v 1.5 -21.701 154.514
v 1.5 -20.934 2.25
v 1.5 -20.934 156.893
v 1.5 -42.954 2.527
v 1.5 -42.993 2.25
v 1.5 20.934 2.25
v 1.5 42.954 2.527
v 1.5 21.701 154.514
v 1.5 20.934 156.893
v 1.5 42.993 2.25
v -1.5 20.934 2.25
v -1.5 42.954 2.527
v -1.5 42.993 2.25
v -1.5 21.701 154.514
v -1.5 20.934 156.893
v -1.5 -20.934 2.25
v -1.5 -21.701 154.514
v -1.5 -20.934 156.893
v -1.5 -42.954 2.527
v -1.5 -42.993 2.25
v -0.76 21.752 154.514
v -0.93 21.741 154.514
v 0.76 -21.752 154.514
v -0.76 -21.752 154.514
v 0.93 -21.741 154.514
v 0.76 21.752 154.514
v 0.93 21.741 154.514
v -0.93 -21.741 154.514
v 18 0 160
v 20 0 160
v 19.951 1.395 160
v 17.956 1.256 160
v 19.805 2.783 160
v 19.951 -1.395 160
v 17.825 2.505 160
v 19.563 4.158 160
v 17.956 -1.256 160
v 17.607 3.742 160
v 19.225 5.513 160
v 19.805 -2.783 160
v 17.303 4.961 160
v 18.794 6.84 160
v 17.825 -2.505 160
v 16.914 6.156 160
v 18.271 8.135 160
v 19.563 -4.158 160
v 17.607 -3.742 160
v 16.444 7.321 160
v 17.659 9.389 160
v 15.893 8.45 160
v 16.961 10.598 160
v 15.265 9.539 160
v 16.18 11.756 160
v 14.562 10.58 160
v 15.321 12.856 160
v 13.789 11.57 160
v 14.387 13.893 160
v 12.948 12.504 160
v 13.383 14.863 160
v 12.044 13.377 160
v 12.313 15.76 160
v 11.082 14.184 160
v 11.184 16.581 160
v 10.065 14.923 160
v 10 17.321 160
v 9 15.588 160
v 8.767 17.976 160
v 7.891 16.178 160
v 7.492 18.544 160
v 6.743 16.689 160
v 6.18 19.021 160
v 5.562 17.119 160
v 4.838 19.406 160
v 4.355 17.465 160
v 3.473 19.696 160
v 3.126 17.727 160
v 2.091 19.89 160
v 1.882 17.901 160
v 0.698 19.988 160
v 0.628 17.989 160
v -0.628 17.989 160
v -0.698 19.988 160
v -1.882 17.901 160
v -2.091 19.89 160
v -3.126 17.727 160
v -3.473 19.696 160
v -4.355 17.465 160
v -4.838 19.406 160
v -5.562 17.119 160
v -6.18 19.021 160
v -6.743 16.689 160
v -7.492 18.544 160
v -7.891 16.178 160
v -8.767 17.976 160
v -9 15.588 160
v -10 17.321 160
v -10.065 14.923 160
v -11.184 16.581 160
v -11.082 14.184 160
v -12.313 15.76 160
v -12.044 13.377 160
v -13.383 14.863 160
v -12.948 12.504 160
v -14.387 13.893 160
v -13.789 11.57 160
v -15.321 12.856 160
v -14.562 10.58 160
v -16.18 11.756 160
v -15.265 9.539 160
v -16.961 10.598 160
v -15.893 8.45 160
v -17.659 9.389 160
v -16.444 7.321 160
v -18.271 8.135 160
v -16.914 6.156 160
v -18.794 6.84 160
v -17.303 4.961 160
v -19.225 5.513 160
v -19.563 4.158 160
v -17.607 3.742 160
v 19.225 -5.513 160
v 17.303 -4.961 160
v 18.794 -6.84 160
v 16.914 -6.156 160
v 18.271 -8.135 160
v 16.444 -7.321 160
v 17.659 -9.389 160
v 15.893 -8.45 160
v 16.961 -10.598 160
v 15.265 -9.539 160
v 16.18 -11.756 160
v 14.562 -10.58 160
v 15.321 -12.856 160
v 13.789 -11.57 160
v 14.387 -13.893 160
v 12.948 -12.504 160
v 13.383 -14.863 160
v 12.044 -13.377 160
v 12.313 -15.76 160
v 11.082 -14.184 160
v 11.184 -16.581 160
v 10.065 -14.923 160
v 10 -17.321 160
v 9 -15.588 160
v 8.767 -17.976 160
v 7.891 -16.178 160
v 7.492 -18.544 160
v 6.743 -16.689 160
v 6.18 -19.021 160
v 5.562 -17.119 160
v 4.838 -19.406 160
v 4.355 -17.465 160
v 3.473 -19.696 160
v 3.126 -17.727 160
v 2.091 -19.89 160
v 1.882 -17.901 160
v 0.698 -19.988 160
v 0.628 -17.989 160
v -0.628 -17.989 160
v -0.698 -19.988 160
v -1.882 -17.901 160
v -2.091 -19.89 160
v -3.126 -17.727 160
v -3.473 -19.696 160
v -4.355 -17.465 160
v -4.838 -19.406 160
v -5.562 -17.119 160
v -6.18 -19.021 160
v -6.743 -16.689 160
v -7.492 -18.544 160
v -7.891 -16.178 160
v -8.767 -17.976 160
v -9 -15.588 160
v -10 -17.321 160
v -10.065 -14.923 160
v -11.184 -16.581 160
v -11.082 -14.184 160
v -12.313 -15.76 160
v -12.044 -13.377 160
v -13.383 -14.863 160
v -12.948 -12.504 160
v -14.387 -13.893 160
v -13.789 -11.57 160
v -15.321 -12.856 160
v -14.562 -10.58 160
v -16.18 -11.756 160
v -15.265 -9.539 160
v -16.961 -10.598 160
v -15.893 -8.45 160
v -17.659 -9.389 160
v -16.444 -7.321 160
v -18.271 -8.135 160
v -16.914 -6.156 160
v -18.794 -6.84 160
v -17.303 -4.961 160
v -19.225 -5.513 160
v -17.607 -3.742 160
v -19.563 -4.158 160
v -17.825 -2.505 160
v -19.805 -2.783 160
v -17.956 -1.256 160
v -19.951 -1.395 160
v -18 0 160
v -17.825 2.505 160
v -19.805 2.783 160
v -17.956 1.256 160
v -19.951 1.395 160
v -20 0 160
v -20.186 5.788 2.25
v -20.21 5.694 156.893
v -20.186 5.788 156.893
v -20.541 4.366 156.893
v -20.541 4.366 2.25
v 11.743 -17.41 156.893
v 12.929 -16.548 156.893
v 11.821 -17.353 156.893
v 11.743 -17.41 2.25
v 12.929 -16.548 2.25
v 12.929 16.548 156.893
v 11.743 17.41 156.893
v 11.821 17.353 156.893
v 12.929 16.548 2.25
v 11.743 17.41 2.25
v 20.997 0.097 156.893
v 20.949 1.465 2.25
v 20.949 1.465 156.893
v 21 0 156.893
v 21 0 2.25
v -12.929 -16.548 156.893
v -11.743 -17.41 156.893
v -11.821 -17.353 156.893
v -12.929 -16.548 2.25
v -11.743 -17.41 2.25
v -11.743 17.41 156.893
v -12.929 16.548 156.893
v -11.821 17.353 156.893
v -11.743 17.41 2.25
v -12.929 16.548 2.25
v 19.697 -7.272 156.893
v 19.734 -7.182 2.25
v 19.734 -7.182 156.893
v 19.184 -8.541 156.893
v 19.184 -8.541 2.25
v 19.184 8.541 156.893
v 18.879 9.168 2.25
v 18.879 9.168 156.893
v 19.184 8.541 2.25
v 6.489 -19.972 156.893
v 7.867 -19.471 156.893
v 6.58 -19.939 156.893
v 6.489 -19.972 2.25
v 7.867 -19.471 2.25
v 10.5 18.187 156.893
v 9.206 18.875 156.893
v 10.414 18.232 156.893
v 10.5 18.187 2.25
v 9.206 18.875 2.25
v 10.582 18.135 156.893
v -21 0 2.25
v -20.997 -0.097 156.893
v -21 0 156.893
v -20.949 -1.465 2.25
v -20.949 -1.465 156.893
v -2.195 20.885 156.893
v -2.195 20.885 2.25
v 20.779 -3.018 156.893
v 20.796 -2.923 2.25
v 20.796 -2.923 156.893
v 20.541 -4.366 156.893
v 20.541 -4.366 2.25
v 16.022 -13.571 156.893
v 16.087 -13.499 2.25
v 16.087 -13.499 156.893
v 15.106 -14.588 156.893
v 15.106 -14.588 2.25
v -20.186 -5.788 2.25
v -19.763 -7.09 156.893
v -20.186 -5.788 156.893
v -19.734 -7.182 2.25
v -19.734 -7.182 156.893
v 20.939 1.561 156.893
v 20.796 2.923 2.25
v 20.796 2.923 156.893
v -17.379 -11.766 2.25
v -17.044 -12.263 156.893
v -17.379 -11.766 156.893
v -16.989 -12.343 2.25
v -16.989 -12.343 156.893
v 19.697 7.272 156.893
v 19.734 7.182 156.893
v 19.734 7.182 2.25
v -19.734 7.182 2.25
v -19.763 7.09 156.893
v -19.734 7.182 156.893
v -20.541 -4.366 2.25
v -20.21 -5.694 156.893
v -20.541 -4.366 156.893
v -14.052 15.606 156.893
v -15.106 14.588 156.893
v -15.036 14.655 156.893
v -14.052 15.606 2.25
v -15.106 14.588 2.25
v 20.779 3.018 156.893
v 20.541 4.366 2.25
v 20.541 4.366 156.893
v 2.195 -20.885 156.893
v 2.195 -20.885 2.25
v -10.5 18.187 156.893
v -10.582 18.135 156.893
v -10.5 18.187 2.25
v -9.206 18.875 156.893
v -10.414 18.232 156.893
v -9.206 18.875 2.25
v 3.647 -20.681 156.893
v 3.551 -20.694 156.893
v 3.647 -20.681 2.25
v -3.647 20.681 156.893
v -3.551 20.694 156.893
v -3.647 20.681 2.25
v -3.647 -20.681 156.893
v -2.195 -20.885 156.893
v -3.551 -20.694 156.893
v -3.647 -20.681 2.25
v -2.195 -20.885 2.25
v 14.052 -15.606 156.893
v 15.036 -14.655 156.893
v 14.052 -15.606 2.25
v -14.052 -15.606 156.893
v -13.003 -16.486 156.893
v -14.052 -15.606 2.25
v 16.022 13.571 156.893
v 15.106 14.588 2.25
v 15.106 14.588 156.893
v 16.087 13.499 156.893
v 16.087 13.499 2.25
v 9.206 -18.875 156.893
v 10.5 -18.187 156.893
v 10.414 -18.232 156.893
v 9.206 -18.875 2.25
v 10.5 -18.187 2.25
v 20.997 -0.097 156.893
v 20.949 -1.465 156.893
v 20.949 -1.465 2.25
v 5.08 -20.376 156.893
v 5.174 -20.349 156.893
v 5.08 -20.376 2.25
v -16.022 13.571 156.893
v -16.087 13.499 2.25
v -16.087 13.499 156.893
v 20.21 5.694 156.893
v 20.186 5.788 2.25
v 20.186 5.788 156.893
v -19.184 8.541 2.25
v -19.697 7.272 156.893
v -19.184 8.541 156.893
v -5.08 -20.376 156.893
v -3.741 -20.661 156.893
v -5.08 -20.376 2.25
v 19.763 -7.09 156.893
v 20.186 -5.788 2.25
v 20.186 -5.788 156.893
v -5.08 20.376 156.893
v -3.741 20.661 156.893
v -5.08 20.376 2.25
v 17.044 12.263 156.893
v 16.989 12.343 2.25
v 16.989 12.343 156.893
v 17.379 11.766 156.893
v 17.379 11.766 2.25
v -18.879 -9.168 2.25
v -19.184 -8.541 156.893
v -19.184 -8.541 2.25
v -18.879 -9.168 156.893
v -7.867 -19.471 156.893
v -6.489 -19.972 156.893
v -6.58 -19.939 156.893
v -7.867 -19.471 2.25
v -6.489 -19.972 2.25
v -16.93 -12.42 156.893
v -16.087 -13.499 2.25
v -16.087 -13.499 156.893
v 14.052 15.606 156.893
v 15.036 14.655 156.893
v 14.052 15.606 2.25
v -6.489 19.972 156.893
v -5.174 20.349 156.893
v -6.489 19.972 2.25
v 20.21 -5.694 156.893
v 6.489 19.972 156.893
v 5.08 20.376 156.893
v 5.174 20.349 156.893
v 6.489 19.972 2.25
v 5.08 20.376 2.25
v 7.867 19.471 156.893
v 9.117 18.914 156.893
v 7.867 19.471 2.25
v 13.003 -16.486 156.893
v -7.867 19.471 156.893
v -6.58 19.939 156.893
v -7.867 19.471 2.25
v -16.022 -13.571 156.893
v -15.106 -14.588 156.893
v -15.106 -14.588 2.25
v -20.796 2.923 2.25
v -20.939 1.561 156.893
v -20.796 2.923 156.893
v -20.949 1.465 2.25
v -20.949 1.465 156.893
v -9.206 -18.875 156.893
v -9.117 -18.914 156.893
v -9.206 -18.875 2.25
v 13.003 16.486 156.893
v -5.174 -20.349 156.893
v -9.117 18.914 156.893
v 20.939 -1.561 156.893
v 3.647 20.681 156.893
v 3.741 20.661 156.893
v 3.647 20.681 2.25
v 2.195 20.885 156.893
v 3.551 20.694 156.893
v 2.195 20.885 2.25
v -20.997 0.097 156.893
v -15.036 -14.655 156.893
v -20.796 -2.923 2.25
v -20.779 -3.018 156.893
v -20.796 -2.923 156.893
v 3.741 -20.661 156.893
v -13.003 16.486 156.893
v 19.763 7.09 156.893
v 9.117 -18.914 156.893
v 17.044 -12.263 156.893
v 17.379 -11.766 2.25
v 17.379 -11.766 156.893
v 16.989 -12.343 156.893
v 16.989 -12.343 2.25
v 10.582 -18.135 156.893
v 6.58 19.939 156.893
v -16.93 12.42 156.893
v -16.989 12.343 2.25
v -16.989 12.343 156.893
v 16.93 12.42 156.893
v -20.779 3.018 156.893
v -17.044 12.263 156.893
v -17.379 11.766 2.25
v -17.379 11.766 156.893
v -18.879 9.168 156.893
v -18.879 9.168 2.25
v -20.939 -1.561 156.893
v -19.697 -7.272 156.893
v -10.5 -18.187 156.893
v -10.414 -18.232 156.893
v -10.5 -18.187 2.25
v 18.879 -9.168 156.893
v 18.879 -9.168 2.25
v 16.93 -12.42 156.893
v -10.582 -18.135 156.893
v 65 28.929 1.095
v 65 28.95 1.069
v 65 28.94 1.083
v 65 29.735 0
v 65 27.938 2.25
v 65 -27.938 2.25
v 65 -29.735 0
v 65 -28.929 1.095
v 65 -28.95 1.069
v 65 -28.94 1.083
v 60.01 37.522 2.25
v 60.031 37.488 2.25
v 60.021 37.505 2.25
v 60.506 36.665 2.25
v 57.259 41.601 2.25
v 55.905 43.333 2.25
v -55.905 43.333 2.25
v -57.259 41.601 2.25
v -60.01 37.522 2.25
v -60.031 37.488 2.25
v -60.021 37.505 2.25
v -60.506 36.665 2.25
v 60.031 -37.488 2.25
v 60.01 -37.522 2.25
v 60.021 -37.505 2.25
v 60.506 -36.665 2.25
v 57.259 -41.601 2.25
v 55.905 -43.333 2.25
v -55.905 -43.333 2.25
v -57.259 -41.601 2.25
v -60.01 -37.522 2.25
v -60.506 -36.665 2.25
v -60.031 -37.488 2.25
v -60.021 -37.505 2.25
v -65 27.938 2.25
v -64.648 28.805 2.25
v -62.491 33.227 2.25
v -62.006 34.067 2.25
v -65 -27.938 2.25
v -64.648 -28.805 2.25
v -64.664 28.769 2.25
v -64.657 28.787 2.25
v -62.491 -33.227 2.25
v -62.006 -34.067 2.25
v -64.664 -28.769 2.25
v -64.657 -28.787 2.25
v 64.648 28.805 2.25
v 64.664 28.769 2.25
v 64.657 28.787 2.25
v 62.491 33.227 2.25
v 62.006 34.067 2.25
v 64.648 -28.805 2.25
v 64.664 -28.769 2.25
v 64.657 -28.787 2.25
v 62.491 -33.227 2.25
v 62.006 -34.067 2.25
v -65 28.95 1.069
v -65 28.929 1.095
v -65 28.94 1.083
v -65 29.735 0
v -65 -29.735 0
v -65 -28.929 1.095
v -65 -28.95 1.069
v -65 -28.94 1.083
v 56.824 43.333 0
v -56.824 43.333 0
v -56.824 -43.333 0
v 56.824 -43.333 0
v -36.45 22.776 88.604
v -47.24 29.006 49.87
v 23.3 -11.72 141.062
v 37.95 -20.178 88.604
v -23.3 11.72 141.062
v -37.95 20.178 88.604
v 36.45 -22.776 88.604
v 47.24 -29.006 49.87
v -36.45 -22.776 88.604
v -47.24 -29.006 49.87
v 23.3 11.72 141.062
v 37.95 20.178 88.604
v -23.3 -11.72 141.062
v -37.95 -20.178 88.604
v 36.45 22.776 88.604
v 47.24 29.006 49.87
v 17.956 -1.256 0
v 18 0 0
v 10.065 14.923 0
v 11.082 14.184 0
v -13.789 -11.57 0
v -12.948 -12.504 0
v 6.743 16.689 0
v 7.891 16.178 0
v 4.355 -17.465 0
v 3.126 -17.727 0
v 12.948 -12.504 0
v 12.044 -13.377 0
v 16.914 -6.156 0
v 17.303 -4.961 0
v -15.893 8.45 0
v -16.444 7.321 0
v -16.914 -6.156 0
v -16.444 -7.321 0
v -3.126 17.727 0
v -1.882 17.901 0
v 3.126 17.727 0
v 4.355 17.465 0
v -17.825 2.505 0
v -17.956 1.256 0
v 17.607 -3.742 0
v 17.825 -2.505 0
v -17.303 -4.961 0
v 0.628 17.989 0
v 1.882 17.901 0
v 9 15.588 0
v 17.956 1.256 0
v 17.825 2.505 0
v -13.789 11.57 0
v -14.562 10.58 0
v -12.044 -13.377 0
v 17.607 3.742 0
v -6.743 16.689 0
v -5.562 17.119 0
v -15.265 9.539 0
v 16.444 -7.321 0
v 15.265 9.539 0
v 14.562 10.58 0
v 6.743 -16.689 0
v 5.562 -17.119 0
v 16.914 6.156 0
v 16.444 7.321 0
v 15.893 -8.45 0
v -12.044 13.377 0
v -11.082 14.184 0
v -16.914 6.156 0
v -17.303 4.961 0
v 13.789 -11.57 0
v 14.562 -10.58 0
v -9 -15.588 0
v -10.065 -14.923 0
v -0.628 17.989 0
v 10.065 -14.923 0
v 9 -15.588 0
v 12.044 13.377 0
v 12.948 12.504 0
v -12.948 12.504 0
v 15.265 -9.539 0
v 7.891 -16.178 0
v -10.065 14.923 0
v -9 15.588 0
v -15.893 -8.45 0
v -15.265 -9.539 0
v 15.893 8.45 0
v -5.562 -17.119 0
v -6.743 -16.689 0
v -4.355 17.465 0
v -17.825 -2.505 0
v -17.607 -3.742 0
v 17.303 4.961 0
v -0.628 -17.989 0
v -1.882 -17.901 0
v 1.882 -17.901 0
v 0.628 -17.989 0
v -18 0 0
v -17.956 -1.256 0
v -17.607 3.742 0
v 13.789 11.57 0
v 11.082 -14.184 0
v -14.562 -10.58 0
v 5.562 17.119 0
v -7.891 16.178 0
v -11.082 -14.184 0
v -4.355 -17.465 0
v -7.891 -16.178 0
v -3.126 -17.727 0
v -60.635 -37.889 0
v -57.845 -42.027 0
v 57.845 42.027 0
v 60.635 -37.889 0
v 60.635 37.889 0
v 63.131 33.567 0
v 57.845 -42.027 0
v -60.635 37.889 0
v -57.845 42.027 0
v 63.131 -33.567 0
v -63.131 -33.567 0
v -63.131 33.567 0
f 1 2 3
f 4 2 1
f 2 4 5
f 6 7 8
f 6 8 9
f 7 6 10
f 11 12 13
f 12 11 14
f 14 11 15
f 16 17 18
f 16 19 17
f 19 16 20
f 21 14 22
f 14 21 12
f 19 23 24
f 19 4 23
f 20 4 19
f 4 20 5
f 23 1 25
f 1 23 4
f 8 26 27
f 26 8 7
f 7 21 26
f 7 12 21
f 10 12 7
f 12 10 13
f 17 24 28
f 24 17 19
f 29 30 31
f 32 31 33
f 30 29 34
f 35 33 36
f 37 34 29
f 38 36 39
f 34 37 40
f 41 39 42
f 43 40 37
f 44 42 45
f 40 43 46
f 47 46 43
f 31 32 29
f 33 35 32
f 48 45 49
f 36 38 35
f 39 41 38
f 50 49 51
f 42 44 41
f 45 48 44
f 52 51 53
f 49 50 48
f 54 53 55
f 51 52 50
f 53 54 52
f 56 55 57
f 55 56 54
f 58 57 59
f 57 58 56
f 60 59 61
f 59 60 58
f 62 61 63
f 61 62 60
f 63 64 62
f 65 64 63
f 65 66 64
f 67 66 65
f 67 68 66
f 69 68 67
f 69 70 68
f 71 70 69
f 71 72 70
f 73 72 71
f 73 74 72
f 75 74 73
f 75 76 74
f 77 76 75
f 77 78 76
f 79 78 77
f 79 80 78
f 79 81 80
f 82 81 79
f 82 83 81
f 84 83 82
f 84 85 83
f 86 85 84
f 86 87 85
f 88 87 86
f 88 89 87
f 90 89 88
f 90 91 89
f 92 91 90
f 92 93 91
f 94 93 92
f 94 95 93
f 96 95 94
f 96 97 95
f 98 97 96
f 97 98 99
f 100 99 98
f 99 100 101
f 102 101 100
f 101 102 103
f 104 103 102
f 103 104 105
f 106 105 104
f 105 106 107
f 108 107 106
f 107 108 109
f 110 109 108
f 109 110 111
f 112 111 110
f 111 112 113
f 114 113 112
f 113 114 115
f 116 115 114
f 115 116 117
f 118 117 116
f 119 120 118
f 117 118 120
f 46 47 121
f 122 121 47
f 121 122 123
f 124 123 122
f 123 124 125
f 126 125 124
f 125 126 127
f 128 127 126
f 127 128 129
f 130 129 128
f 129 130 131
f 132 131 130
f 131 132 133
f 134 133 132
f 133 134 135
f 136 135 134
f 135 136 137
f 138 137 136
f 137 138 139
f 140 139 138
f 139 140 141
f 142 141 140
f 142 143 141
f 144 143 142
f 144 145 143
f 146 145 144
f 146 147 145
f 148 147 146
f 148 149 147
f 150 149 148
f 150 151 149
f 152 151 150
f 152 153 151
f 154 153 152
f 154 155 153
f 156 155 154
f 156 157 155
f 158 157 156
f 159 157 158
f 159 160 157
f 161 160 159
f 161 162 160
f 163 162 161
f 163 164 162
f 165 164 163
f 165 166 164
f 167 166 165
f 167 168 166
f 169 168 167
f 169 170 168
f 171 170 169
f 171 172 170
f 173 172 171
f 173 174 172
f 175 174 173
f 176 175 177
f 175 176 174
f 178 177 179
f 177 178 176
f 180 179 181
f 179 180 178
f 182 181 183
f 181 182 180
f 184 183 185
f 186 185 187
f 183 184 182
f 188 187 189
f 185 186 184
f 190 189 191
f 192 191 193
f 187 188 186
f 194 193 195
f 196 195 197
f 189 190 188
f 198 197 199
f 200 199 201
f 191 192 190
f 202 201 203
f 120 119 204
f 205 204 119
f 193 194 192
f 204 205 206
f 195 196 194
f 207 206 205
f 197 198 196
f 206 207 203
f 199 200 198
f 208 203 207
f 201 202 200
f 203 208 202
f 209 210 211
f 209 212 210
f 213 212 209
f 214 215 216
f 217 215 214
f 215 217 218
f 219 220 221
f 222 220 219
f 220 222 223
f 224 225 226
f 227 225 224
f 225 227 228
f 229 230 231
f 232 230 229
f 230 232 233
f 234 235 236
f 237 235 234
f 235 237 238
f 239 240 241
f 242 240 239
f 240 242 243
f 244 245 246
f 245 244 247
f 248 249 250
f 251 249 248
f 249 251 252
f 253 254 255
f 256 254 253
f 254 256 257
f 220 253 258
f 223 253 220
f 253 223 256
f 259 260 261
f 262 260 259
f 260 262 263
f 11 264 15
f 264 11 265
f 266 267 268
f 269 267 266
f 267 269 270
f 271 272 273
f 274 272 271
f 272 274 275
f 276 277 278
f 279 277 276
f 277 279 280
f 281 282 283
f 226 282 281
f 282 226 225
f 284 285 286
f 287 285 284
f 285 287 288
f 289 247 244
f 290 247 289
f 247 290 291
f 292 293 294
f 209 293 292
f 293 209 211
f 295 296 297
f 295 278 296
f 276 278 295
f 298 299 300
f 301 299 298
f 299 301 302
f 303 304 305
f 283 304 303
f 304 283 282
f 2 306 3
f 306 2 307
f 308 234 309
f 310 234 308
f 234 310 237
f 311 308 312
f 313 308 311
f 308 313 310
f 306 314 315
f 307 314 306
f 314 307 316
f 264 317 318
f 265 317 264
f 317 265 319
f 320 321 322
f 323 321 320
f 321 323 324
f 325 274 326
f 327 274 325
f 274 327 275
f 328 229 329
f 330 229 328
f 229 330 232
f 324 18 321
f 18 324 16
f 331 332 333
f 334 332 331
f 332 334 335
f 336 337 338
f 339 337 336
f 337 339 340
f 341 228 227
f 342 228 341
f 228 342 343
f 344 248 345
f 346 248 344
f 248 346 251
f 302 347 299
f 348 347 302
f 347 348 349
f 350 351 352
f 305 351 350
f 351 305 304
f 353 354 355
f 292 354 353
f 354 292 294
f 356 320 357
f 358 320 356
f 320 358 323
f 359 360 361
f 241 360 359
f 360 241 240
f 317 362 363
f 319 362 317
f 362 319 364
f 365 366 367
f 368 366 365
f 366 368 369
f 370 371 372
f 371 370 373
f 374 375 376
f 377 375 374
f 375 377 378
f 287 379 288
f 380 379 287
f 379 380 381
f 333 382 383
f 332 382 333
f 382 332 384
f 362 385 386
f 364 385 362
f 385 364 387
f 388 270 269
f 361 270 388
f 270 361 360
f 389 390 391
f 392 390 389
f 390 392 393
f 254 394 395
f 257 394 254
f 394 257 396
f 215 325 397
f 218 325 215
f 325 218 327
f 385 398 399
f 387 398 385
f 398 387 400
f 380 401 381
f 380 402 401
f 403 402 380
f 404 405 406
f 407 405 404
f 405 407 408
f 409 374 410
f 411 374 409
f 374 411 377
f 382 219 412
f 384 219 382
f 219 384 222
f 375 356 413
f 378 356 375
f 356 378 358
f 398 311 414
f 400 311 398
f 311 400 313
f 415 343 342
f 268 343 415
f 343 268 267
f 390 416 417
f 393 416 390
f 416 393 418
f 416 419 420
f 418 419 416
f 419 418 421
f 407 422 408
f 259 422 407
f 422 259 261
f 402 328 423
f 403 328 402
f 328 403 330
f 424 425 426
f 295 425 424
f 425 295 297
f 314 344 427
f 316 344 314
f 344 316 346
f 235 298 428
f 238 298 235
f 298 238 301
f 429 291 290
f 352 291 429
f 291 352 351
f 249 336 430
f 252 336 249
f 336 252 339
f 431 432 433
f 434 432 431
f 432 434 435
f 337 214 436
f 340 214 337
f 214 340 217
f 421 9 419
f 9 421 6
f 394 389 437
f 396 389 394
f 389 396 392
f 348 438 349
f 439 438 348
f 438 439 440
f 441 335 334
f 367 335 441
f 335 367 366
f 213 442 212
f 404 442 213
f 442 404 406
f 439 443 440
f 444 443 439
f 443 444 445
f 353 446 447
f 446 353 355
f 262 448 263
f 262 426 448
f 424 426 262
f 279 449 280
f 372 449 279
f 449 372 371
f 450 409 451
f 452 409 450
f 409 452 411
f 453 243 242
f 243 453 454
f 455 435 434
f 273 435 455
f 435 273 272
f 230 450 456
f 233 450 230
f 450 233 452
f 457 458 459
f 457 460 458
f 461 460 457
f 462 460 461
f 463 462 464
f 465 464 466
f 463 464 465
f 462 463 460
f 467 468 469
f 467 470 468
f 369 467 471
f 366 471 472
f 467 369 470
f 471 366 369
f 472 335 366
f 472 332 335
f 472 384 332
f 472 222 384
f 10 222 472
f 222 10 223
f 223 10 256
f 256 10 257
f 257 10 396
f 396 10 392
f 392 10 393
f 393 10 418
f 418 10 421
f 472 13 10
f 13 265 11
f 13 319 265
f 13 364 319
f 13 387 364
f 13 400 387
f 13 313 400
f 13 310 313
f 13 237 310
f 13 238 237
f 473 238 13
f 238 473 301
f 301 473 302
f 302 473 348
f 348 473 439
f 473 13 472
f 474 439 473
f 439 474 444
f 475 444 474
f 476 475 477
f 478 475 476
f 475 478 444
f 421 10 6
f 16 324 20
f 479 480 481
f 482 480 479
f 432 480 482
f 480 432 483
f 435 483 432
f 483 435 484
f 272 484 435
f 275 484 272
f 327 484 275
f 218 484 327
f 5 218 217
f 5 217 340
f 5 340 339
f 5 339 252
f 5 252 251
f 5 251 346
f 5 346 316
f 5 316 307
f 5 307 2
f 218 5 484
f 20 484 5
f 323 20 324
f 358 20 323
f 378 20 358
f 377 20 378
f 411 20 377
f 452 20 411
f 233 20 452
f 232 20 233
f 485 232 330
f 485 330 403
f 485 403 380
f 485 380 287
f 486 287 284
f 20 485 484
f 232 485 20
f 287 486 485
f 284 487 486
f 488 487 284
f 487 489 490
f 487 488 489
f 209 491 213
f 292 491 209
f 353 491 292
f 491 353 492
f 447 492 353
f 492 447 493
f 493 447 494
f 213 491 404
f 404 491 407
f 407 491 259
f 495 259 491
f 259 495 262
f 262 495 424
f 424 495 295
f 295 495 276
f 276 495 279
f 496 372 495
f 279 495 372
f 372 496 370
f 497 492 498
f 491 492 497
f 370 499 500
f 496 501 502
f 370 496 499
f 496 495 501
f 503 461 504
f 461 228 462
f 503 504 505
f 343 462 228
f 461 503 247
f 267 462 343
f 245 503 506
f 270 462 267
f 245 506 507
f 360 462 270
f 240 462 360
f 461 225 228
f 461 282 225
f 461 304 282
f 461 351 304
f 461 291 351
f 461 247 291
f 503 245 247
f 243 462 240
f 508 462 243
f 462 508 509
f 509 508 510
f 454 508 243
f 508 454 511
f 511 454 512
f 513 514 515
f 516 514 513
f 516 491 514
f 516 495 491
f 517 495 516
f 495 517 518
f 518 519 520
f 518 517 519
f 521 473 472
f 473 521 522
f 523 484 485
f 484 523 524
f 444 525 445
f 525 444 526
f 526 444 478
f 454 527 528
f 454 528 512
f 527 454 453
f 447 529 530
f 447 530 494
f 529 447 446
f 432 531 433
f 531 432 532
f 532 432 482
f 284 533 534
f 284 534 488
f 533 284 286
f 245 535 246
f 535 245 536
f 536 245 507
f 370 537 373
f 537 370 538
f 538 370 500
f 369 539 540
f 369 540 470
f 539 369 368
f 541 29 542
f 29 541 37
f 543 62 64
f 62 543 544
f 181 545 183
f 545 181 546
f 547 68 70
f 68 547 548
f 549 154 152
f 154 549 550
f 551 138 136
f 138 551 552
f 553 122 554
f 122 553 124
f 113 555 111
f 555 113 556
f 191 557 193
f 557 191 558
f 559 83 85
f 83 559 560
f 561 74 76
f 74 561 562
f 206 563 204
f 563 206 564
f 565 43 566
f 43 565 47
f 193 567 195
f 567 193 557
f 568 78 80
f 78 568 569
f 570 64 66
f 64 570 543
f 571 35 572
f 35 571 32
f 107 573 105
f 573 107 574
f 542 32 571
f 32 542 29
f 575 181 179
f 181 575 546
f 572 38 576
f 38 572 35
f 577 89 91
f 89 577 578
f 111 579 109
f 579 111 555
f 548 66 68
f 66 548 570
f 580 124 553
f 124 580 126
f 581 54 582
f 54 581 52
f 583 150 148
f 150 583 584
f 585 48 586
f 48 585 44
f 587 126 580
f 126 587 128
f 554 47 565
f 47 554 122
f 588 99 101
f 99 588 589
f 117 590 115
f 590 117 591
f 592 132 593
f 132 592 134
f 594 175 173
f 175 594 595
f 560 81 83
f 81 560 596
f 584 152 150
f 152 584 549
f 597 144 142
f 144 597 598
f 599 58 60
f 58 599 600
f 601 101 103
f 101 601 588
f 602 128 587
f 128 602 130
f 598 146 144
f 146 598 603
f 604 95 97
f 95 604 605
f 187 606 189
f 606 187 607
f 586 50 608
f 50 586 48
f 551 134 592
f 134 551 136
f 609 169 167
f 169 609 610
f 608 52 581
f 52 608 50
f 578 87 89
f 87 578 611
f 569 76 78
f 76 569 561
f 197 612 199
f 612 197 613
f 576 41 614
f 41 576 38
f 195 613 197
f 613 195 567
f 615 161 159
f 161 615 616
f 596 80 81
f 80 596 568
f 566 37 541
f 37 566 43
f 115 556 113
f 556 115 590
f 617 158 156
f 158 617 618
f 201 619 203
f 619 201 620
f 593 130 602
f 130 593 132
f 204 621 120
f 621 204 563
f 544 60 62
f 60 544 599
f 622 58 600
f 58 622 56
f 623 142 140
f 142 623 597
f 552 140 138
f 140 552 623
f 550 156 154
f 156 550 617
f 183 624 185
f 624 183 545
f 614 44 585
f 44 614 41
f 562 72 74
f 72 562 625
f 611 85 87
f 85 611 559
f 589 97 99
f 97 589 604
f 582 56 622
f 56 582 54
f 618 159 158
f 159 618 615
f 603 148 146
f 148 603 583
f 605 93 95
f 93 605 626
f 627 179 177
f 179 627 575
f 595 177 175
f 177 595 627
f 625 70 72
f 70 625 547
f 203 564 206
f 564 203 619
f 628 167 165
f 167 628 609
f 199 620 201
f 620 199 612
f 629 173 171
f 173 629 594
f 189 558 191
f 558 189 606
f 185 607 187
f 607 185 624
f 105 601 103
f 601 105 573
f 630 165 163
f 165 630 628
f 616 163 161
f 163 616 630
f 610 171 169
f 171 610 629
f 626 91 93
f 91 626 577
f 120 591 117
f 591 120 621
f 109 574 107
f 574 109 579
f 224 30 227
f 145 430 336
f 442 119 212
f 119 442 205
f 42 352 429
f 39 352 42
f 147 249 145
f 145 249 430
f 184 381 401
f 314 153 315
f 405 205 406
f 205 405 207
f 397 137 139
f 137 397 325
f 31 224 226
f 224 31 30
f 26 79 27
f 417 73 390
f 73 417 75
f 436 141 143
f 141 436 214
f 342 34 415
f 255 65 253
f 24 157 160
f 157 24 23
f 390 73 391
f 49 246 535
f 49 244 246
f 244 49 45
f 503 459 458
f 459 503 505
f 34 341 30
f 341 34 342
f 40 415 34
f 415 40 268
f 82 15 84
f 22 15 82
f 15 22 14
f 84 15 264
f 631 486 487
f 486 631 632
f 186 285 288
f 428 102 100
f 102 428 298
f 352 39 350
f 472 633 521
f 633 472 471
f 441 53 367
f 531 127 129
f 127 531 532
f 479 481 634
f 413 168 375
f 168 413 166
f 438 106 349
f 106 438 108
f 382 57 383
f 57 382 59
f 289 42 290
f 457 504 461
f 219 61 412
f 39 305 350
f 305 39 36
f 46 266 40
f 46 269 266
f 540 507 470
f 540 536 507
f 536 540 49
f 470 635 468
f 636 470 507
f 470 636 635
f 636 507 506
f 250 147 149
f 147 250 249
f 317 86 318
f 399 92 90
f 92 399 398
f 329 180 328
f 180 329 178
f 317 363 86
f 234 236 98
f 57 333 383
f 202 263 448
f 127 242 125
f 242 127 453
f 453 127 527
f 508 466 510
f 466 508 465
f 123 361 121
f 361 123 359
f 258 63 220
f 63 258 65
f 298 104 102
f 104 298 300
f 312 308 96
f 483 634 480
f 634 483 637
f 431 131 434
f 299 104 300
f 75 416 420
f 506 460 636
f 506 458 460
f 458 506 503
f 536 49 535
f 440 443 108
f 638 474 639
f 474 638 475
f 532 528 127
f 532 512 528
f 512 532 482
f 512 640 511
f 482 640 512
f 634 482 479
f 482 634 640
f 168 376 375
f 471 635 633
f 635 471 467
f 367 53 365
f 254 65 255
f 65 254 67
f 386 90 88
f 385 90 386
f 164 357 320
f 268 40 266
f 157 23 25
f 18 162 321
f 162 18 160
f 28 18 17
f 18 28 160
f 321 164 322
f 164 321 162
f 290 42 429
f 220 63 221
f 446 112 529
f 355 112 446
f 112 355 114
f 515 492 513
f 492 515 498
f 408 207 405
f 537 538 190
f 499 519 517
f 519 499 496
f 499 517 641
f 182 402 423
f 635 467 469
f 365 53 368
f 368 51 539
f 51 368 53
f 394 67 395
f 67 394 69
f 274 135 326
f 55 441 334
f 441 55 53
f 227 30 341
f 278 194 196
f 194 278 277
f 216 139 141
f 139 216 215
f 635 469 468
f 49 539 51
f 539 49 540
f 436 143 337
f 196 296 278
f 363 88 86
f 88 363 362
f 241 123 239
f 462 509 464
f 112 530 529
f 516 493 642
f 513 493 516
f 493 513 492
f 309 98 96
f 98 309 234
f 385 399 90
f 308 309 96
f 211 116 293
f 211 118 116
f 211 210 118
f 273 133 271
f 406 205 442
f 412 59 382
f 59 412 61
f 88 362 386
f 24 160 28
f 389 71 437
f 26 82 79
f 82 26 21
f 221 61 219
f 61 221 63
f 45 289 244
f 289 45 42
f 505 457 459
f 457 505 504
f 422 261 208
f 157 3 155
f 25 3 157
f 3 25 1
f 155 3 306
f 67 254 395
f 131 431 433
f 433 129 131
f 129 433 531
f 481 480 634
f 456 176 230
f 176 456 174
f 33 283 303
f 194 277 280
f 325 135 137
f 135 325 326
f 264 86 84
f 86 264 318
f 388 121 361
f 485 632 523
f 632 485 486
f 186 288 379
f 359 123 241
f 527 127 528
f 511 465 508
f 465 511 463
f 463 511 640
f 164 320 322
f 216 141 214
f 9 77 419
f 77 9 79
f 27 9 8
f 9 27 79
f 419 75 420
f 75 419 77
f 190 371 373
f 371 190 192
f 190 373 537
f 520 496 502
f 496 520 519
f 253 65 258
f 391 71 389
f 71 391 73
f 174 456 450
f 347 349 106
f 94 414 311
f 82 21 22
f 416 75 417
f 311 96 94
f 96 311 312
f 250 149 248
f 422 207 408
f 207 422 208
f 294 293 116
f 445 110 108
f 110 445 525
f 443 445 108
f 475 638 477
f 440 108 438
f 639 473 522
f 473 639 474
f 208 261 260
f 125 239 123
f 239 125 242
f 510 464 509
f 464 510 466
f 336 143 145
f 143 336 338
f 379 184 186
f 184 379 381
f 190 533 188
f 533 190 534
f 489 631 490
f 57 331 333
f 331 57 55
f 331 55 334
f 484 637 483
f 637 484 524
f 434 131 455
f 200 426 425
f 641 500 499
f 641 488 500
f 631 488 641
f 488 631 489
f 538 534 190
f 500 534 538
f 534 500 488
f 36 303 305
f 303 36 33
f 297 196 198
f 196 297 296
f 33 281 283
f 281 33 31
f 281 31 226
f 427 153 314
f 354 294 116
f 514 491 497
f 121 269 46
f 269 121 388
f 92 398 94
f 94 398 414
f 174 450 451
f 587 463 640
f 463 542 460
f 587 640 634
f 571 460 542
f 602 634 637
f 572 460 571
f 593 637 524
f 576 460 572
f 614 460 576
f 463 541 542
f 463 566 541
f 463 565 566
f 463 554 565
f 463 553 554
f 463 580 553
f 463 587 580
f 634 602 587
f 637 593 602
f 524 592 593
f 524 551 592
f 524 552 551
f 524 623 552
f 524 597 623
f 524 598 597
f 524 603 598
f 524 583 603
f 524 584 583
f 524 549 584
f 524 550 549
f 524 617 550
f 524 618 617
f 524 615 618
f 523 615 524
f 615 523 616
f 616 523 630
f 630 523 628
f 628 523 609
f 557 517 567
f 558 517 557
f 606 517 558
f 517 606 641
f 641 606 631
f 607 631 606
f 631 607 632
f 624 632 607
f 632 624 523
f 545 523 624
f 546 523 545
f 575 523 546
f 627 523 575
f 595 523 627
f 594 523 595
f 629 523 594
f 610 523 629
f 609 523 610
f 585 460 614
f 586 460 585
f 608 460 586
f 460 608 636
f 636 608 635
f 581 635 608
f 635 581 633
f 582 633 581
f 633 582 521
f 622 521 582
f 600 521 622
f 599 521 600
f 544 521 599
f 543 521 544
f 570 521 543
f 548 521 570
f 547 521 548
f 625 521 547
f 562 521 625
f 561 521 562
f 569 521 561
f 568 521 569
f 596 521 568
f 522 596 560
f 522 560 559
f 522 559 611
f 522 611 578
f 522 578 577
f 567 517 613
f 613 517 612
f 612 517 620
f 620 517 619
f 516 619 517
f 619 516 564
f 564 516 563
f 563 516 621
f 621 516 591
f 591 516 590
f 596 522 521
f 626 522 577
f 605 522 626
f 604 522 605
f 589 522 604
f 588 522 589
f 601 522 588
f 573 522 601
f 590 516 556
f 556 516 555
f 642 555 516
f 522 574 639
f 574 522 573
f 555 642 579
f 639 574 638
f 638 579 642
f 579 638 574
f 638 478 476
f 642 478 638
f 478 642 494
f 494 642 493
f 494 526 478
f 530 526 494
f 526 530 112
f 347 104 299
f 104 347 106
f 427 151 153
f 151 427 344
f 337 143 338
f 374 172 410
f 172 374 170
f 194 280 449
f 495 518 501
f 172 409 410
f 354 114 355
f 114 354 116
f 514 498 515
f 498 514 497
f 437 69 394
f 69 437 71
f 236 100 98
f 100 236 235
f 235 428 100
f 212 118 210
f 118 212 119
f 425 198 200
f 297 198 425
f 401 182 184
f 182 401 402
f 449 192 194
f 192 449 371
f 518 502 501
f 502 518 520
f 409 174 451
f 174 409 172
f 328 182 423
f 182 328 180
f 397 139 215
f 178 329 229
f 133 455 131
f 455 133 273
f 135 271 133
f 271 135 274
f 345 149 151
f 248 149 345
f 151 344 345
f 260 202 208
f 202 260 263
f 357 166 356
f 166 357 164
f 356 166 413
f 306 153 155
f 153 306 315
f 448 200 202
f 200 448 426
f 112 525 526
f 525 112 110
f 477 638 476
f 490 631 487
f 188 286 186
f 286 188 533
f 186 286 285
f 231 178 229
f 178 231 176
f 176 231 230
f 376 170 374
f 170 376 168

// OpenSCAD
$fn = 90;

height = 140 + 20;
cylinder_thickness = 3;
plate_thickness = cylinder_thickness;
hole_d = 36;
outer_d = hole_d+2*cylinder_thickness;
width = 130;
width2 = width*2/3;

difference() {
    //translate([25,0,25]) cube([50, 5, 50], center = true);
}

intersection() {
    difference() {
        union() {
            translate([0,0,height/2]) cylinder(d=outer_d, h=height, center=true);
            translate([0,0,cylinder_thickness/4]) cube([width,width2,plate_thickness], center = true);
            rotate([0,0,+60]) cube([plate_thickness, 1000, 1000], center=true);
            rotate([0,0,-60]) cube([plate_thickness, 1000, 1000], center=true);
            intersection() {
                cube([plate_thickness, 1000,1000], center=true);
                translate([0,0,height/2]) cylinder(d1=width2, d2=outer_d, h=height, center=true);
            };
        }
        cylinder(d=hole_d, h=1000, center=true);
    }
    translate([0,0,height/2]) cylinder(d1=width*1.1,d2=outer_d-plate_thickness*2/3,h=height, center=true);
}
*translate([outer_d/2+15+plate_thickness,0,0]) difference() {
    translate([0,0,30+plate_thickness/2]) cube([30+2*plate_thickness,30+2*plate_thickness,60+plate_thickness], center=true);
    translate([0,0,30-0.1]) cube([30,30,60], center=true);
}
